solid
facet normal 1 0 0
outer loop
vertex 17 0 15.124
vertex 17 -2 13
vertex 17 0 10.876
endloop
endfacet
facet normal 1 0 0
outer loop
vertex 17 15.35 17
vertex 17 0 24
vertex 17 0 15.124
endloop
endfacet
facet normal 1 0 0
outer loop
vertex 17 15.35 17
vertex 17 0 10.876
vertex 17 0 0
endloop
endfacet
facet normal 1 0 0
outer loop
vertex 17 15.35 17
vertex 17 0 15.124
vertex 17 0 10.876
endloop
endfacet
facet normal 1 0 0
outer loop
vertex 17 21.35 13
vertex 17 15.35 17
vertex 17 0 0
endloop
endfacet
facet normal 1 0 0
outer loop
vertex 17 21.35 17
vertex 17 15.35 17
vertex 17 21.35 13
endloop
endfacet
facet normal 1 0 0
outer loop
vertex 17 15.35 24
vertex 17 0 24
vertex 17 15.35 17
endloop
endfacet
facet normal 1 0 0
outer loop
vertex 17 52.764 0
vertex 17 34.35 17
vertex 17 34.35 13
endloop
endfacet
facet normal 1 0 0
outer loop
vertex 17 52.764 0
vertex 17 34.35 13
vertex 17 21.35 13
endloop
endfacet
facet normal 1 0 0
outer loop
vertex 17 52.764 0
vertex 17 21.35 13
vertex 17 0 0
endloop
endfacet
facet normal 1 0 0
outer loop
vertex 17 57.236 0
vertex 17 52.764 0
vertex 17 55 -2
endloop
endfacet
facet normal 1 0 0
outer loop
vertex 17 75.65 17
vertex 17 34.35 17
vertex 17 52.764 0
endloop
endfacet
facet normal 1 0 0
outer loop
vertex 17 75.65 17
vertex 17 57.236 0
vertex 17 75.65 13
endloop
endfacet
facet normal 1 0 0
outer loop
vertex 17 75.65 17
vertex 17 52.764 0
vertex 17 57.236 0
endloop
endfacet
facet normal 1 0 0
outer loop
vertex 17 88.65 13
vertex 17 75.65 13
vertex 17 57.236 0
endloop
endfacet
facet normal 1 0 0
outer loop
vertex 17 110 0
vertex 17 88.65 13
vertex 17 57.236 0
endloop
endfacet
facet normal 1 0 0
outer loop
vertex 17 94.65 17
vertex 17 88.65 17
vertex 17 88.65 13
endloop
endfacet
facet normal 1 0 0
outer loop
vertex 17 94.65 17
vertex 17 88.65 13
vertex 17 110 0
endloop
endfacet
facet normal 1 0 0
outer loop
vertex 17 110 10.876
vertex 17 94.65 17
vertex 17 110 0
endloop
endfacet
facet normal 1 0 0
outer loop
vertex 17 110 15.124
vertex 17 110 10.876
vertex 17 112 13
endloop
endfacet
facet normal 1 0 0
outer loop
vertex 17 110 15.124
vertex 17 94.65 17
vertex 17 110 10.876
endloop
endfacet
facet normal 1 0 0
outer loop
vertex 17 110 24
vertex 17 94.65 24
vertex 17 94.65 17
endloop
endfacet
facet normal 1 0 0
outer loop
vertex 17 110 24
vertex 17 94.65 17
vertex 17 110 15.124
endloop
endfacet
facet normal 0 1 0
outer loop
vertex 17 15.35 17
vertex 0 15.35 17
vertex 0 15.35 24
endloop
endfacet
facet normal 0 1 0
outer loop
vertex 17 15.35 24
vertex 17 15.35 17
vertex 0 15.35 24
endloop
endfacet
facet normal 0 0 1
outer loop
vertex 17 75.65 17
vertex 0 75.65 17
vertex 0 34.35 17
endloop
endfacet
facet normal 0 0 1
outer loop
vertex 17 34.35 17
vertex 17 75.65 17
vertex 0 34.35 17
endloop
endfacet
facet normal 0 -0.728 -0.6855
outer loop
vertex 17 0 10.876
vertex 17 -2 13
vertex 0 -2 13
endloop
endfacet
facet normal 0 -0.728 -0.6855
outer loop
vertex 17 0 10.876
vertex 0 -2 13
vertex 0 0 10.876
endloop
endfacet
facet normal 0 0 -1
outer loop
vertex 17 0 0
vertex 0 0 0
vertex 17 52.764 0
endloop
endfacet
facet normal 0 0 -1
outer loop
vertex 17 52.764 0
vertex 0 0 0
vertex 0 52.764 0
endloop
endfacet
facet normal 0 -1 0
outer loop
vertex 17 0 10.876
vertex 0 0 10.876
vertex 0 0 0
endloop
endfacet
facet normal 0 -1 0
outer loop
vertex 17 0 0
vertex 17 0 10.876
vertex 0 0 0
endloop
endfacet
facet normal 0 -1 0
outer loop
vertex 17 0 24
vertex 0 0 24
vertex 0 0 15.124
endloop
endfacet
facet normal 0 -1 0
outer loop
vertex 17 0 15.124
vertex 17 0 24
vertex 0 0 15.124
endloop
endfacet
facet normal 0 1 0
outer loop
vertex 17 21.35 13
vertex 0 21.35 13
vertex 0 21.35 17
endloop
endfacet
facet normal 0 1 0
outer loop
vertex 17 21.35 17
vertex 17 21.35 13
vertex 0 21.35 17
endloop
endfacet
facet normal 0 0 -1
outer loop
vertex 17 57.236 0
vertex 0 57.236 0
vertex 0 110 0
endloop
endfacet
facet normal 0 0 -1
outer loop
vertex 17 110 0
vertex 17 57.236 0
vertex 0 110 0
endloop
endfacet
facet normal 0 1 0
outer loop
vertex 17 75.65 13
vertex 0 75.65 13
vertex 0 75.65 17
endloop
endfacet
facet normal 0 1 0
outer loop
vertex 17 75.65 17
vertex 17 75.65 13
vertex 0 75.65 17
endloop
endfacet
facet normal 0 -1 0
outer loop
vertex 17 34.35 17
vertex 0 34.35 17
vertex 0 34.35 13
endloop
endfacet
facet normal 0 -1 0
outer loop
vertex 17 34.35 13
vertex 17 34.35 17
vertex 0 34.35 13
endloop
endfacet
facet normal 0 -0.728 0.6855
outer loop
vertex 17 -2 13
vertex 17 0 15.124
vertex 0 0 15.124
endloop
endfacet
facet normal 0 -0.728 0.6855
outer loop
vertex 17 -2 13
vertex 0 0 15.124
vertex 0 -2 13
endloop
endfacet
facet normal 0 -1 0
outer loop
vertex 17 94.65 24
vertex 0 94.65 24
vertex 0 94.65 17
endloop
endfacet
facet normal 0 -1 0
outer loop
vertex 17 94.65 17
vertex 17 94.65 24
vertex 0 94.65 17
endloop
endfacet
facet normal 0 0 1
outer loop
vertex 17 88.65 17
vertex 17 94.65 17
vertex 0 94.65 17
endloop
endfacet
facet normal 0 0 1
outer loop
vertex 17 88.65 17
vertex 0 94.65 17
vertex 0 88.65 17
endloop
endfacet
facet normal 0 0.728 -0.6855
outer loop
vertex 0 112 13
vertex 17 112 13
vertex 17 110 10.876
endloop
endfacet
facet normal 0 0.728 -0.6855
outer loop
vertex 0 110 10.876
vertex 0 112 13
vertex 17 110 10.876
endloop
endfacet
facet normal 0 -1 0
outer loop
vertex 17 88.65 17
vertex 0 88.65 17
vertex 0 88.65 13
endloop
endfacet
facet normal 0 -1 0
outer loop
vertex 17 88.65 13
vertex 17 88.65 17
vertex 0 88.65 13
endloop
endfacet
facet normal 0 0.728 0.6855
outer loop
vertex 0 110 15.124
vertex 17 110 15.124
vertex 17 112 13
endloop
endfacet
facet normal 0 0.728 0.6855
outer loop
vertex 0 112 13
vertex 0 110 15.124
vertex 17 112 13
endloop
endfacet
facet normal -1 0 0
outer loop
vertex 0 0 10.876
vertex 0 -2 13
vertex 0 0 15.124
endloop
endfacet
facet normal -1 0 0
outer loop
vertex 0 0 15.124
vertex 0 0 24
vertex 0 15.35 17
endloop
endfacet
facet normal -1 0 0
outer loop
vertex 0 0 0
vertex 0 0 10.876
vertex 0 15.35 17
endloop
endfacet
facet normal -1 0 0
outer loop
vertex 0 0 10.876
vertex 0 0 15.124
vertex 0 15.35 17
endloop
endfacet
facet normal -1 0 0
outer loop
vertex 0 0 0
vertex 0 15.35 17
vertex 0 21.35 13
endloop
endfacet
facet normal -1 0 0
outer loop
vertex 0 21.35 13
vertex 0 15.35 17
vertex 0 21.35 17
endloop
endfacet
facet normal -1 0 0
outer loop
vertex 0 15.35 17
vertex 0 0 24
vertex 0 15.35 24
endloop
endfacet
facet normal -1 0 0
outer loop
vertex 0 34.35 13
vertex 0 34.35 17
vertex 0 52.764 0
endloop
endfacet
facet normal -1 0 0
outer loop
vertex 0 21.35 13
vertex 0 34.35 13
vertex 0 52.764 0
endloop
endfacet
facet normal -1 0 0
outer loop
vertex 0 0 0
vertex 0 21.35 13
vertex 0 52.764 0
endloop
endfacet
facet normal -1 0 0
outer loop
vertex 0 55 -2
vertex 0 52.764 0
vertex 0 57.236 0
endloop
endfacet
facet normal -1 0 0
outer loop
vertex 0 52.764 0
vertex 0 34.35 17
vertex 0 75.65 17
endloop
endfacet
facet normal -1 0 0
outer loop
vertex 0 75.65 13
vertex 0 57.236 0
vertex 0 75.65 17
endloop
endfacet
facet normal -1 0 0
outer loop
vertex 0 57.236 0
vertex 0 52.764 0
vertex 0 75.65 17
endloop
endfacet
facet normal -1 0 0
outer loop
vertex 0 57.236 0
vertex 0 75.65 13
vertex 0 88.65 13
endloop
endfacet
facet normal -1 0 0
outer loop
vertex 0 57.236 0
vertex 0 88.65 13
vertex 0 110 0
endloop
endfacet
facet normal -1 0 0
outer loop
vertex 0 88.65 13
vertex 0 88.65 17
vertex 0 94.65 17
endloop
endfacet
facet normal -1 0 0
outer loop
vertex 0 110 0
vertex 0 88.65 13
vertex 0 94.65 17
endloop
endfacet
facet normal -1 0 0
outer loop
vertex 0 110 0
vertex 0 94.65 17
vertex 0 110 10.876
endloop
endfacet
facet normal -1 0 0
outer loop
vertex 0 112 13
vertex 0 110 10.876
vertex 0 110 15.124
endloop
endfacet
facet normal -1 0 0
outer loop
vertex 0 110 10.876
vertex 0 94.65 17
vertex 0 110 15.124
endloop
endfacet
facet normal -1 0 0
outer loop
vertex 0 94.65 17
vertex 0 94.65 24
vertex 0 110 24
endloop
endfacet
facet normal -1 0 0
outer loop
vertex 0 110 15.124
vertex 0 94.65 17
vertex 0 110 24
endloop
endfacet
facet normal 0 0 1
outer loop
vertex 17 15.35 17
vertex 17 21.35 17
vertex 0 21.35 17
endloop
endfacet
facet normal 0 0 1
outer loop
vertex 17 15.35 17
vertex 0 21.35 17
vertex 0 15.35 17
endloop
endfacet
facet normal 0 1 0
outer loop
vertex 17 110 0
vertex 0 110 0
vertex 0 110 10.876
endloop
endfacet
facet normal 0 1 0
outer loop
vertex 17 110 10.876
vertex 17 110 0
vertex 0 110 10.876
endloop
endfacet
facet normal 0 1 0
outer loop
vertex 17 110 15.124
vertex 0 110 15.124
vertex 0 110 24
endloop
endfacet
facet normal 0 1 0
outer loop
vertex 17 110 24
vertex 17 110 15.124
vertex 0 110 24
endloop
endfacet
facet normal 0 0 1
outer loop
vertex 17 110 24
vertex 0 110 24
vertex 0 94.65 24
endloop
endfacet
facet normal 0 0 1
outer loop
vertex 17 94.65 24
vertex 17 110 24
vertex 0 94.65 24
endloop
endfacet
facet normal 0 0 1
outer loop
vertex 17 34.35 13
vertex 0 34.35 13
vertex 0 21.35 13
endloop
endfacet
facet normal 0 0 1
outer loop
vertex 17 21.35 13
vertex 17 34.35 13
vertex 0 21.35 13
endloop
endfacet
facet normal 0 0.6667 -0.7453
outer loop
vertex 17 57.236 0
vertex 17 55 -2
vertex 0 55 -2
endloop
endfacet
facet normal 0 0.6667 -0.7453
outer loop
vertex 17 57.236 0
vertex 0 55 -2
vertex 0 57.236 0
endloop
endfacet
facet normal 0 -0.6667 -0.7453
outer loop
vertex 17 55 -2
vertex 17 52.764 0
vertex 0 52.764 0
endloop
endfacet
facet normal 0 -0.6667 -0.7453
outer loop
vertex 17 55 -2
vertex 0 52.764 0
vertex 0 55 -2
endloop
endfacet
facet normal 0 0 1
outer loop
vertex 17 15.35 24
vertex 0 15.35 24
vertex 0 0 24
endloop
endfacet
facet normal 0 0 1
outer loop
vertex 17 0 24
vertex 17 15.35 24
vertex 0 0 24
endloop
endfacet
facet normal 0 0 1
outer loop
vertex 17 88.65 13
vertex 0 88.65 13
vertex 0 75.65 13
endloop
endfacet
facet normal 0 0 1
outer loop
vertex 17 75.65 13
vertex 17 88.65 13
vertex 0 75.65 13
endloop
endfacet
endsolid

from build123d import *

# Parameters (mm, degrees)
F1_DEPTH = 17
F3_DEPTH = 17
F5_DEPTH = 17


# Not quite as in the source:
# - a pattern or mirror of a feature is missing from the dataset's text; its kind, count and spacing are read off the source's solid


with BuildPart() as f1:
    # F0 (on Right) → F1 (new body)
    with BuildSketch(Plane.YZ):
        Polygon((0, 24), (0, 0), (110, 0), (110, 24), (94.65, 24), (94.65, 17), (88.65, 17), (88.65, 13), (75.65, 13), (75.65, 17), (34.35, 17), (34.35, 13), (21.35, 13), (21.35, 17), (15.35, 17), (15.35, 24), align=None)
    extrude(amount=F1_DEPTH)

    # F2 (on face) → F3 (join, through all)
    with BuildSketch(Plane.YZ.offset(17)):
        Polygon((57.2362883389, 0), (55, 0), (55, -2), align=None)
        Polygon((55, 0), (52.7637116611, 0), (55, -2), align=None)
    extrude(amount=-F3_DEPTH)

    # F4 (on face) → F5 (join, through all)
    with BuildSketch(Plane.YZ.offset(17)):
        Polygon((0, 10.8757078871), (0, 13), (-2, 13), align=None)
        Polygon((-2, 13), (0, 13), (0, 15.1242921129), align=None)
    f5 = extrude(amount=-F5_DEPTH)

    # F5_copies: F5 across plane
    add(f5.mirror(Plane.ZX.offset(55)))


solid = f1.part
